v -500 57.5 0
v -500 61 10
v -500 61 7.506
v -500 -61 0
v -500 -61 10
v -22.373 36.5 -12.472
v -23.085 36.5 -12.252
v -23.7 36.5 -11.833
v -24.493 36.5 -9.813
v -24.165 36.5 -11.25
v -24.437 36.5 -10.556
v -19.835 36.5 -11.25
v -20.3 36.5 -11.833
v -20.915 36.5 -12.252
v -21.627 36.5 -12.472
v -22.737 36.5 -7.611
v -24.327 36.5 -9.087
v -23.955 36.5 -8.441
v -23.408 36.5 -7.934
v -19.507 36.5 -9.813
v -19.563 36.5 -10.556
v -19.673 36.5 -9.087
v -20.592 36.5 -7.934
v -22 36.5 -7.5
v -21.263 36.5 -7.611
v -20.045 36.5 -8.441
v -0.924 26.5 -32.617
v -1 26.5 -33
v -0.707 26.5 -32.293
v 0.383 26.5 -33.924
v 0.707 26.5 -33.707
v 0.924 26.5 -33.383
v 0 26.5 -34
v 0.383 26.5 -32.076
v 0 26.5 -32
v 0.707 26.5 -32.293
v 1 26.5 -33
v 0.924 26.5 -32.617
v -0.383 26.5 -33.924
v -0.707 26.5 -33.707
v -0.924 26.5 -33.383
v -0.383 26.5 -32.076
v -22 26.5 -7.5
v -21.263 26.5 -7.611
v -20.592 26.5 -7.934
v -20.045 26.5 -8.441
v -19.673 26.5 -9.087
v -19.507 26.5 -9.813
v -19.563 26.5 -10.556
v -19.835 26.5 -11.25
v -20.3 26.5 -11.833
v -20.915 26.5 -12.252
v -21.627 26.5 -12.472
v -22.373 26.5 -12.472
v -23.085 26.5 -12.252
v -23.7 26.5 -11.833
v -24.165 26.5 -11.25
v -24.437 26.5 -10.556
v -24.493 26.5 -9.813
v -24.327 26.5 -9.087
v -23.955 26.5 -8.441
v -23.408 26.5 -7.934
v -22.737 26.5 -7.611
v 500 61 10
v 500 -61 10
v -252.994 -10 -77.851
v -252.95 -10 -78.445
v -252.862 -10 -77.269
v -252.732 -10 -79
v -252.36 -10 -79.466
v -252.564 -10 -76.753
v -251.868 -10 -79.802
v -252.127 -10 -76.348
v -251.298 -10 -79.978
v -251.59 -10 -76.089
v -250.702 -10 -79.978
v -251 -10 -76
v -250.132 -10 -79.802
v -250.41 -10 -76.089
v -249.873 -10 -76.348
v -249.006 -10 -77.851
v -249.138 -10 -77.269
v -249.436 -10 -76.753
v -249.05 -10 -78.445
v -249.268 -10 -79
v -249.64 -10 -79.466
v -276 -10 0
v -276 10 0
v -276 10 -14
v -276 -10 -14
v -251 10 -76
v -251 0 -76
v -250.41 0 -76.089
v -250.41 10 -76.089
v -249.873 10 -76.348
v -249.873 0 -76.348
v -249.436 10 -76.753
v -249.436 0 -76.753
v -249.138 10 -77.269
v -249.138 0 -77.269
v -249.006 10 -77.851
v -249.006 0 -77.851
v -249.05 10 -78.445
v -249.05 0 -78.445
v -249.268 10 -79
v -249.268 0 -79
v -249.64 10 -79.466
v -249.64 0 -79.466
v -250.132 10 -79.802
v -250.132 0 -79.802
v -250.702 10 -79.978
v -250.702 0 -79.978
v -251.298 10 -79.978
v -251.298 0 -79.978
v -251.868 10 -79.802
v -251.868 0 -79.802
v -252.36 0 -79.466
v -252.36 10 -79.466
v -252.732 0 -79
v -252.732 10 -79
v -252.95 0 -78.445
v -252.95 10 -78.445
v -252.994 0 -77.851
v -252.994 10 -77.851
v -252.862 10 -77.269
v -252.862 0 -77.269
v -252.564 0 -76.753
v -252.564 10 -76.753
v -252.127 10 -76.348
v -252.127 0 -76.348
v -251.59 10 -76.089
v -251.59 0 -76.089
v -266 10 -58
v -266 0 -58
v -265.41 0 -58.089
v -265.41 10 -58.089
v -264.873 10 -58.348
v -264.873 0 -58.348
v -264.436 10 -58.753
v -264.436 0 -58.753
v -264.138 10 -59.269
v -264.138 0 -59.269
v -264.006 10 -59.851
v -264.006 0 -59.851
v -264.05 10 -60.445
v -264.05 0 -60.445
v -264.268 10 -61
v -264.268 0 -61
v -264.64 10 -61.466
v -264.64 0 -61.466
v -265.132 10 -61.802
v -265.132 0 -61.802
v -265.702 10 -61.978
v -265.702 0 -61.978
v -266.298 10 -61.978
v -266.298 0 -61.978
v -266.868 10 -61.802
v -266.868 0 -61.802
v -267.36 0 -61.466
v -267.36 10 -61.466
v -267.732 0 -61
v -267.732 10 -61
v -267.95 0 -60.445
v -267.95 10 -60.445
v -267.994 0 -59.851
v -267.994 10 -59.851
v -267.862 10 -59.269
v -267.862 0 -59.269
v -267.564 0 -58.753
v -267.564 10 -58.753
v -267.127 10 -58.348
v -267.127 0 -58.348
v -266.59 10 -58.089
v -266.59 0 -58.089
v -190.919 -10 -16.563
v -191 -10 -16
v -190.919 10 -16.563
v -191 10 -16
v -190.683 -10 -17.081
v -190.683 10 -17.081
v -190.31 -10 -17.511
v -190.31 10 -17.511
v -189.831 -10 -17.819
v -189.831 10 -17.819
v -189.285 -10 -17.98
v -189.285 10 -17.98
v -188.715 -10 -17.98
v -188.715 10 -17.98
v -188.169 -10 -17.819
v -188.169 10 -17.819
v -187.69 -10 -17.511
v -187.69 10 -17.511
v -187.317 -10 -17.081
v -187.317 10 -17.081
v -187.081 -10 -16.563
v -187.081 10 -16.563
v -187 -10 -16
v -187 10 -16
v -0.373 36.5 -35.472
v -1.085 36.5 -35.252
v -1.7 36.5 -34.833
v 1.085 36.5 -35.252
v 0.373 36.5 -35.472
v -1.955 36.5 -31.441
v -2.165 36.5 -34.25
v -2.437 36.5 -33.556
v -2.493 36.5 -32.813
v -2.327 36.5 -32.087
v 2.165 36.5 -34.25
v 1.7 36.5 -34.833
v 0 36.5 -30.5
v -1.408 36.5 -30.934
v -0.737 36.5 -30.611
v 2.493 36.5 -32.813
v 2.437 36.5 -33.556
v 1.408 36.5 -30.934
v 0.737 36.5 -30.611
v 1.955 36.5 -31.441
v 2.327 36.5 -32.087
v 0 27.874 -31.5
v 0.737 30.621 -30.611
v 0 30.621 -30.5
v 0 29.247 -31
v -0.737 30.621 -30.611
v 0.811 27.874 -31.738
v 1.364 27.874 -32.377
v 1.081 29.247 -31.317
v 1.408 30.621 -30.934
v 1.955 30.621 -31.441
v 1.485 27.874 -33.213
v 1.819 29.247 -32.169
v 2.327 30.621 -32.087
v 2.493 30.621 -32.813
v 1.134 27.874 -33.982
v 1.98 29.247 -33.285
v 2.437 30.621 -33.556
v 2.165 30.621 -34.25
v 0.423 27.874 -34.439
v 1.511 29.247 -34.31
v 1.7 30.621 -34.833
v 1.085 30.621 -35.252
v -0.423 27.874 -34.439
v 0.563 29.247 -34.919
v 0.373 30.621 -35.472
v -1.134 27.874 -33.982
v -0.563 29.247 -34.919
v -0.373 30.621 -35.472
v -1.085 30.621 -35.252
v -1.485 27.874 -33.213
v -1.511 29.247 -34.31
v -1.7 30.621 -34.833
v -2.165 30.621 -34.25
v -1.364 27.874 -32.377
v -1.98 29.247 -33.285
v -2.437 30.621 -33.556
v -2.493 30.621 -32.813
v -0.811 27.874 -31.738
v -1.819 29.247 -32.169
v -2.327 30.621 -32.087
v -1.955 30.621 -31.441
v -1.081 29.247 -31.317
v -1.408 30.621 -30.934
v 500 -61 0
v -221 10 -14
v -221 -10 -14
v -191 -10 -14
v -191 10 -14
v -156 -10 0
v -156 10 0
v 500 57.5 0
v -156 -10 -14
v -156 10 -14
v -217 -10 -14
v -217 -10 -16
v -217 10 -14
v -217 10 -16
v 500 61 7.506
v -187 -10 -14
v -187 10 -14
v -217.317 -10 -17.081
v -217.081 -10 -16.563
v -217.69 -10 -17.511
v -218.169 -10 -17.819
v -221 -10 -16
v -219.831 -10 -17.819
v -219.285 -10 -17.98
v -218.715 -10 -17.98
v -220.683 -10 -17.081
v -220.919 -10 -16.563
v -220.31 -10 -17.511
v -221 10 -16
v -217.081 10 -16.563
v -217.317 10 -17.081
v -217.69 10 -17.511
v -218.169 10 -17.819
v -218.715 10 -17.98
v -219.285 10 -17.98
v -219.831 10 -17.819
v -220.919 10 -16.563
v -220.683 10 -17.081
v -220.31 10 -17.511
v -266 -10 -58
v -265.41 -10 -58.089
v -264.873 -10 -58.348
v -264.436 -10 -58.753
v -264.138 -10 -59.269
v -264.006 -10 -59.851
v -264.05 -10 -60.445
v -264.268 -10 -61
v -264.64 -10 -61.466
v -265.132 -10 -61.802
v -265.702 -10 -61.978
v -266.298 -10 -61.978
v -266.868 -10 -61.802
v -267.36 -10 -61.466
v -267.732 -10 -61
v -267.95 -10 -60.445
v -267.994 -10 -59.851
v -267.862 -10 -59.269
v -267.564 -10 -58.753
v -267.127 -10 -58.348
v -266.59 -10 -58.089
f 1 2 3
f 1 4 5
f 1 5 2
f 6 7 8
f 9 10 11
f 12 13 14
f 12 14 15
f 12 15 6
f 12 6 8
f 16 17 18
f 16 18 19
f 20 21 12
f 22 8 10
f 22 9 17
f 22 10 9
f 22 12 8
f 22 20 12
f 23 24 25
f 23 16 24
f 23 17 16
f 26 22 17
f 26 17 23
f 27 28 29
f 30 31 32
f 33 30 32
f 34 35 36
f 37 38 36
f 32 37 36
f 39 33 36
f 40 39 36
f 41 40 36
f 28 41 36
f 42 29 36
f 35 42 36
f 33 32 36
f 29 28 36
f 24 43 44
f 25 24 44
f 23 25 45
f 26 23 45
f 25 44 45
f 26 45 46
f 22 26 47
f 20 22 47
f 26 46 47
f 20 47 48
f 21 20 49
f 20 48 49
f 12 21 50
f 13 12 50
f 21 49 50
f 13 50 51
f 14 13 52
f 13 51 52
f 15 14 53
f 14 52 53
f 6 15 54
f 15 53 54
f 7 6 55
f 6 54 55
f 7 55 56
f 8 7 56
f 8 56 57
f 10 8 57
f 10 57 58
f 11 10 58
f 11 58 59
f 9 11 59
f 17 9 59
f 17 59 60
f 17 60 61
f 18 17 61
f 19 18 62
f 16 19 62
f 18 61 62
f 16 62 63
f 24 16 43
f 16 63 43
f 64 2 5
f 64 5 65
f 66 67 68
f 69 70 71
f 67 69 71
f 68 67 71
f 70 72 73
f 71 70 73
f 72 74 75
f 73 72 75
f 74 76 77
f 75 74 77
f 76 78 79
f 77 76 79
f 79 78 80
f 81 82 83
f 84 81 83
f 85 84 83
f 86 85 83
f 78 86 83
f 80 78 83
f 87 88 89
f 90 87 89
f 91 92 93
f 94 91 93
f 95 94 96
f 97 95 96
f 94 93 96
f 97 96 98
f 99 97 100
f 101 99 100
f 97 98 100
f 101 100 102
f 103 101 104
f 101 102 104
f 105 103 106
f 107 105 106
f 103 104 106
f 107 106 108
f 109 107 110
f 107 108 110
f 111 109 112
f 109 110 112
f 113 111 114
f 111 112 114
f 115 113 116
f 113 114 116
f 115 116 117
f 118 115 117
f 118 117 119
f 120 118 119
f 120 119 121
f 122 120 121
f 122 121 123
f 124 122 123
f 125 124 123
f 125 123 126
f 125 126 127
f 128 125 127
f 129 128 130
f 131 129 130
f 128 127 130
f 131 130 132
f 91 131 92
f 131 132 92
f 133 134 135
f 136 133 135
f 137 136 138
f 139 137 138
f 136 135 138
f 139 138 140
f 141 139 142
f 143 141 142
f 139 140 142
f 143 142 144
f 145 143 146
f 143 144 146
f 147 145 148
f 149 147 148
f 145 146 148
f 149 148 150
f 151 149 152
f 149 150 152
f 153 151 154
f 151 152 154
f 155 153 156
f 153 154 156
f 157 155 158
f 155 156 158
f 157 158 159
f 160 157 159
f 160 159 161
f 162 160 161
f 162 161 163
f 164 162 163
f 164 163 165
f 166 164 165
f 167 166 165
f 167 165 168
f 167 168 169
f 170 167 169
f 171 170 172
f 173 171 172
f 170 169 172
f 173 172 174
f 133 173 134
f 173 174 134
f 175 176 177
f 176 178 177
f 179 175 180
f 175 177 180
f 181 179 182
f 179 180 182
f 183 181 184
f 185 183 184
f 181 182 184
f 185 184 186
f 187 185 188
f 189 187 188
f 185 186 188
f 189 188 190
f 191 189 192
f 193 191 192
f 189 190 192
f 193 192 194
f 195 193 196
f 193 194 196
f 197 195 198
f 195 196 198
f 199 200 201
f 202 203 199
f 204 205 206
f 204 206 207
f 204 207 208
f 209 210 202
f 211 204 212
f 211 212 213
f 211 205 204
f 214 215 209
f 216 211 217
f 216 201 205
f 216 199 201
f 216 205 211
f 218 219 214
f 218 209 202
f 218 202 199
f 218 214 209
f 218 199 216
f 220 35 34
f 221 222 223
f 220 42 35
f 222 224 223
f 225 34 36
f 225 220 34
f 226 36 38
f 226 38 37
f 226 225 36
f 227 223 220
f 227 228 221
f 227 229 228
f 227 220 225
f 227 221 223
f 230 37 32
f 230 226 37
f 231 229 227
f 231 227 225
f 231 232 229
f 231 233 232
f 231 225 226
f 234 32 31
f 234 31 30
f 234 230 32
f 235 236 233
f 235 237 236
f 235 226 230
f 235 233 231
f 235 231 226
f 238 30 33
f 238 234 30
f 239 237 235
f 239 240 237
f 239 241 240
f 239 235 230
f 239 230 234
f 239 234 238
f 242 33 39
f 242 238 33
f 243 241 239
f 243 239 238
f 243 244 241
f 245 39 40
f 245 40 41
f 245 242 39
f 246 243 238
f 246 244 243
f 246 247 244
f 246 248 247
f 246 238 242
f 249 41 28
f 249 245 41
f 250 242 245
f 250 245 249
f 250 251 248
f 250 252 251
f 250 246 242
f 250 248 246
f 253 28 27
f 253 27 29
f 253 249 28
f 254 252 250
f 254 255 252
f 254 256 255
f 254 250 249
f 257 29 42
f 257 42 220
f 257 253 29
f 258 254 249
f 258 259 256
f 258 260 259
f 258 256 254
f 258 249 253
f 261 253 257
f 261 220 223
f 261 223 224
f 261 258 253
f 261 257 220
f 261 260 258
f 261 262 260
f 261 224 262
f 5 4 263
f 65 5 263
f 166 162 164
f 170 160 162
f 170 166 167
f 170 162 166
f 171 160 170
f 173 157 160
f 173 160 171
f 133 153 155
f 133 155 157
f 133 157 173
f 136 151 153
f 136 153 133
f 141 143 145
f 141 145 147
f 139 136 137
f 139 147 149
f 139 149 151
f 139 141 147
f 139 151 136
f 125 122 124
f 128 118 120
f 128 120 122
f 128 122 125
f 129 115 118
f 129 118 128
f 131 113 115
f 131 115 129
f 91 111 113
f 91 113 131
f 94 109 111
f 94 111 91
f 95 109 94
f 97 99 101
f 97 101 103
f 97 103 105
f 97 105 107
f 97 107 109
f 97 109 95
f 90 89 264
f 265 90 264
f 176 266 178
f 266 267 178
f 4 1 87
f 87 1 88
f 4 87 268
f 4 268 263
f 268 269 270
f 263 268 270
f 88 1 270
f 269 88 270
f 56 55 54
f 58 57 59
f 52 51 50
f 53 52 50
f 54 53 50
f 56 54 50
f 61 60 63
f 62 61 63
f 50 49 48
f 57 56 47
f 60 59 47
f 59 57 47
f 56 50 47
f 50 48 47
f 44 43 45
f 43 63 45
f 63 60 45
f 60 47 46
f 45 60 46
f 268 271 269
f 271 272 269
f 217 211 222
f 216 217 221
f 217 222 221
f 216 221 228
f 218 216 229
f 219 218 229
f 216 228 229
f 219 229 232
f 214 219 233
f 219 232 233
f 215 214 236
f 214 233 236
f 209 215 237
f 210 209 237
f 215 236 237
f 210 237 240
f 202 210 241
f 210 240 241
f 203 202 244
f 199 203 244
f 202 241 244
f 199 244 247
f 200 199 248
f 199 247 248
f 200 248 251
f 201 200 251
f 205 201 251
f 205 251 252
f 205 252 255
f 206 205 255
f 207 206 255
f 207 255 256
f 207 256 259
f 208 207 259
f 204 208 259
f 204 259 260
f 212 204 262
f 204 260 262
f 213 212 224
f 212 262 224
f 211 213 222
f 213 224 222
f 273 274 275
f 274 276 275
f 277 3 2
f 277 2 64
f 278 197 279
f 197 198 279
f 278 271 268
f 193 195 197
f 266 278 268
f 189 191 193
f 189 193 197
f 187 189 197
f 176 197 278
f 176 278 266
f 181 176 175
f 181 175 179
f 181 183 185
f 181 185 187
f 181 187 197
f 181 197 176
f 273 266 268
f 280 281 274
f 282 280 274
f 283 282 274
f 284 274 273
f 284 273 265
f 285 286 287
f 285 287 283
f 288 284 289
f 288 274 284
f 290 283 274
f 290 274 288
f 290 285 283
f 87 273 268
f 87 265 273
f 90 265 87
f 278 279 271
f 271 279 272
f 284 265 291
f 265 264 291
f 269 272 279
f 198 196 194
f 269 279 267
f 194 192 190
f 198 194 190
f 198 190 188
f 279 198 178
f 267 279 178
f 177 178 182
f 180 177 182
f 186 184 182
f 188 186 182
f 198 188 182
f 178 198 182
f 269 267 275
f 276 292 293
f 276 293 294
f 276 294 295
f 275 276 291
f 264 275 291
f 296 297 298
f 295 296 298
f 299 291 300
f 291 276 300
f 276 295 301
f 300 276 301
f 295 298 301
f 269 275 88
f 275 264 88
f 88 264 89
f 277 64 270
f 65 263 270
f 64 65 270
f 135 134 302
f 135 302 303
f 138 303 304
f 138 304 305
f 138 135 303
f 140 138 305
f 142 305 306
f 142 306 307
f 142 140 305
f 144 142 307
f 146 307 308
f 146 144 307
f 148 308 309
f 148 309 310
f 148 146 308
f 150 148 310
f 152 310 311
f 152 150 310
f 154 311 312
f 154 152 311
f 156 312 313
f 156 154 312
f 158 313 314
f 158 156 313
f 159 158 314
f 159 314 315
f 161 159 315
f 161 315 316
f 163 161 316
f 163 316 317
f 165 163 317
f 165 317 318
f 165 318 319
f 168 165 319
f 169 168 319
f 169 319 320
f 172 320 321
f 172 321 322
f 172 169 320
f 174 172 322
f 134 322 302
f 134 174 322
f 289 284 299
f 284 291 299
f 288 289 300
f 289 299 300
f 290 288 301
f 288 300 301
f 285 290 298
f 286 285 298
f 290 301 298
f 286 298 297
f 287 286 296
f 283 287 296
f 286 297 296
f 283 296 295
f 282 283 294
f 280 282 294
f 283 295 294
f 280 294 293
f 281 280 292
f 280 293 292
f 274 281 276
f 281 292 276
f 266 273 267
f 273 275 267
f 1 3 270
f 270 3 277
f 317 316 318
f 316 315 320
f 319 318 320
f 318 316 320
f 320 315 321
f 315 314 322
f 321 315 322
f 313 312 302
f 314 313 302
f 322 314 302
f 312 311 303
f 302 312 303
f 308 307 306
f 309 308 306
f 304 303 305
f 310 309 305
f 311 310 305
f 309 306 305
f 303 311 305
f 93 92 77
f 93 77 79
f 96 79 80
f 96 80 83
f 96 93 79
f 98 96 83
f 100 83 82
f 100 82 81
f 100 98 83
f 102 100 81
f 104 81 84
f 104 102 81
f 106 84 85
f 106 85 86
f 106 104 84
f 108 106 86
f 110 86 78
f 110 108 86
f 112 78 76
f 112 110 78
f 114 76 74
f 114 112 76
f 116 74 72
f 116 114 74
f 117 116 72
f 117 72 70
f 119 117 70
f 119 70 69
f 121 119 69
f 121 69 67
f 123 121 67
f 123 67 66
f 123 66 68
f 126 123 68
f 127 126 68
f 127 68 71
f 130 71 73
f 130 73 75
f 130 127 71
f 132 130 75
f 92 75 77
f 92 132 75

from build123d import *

# Parameters (mm, degrees)
SKETCH1_W                 = 1000
SKETCH1_H                 = 122
BOARD_DEPTH               = 10
BOARD_CHAMFER_SIZE        = 3.5
BOARD_CHAMFER_SIZE2       = 7.505774222
DYNAFIT_START             = 26.5
SKETCH2_R                 = 2.5
DYNAFIT_DEPTH             = 10
DYNAFIT_2_DEPTH           = 10
DYNAFIT_PIN_CHAMFER_SIZE  = 1.5
DYNAFIT_PIN_CHAMFER_SIZE2 = 4.121216129
SKETCH5_R                 = 2
RISER_DEPTH               = 10


with BuildPart() as part:
    # Sketch1 → Board (new body)
    with BuildSketch(Plane.XY):
        Rectangle(SKETCH1_W, SKETCH1_H)
    extrude(amount=BOARD_DEPTH)

    # Board chamfer
    board_chamfer_edges = [part.edges().sort_by_distance(p)[0] for p in [
        (0, 61, 0),
    ]]
    board_chamfer_side = [part.faces().sort_by_distance(p)[0] for p in [
        (0, 0, 0),
    ]]
    chamfer(board_chamfer_edges, length=BOARD_CHAMFER_SIZE, length2=BOARD_CHAMFER_SIZE2, reference=board_chamfer_side[0])

    # Sketch5 → Riser (add, symmetric)
    with BuildSketch(Plane(origin=(0, 0, 0), x_dir=(1, 0, 0), z_dir=(0, 1, 0))):
        with Locations(Location((-266, 60, 0), (0, 0, 270))):
            Circle(SKETCH5_R)
        with Locations(Location((-251, 78, 0), (0, 0, 270))):
            Circle(SKETCH5_R)
        with BuildLine():
            Line((-276, 14), (-221, 14))
            Line((-221, 14), (-221, 16))
            ThreePointArc((-221, 16), (-219, 18), (-217, 16))
            Line((-217, 16), (-217, 14))
            Line((-217, 14), (-191, 14))
            Line((-191, 14), (-191, 16))
            ThreePointArc((-191, 16), (-189, 18), (-187, 16))
            Line((-187, 16), (-187, 14))
            Line((-187, 14), (-156, 14))
            Line((-156, 14), (-156, 0))
            Line((-156, 0), (-276, 0))
            Line((-276, 0), (-276, 14))
        make_face()
    extrude(amount=RISER_DEPTH, both=True)


with BuildPart() as body_2:
    # Sketch2 → Dynafit (new body)
    with BuildSketch(Plane(origin=(0, 0, 0), x_dir=(1, 0, 0), z_dir=(0, 1, 0)).offset(DYNAFIT_START)):
        with Locations(Location((0, 33, 0), (0, 0, 270))):
            Circle(SKETCH2_R)
    extrude(amount=DYNAFIT_DEPTH)

    # Dynafit pin chamfer
    dynafit_pin_chamfer_edges = [body_2.edges().sort_by_distance(p)[0] for p in [
        (0, 26.5, -35.5),
    ]]
    dynafit_pin_chamfer_side = [body_2.faces().sort_by_distance(p)[0] for p in [
        (0, 26.5, -33),
    ]]
    chamfer(dynafit_pin_chamfer_edges, length=DYNAFIT_PIN_CHAMFER_SIZE, length2=DYNAFIT_PIN_CHAMFER_SIZE2, reference=dynafit_pin_chamfer_side[0])


with BuildPart() as body_3:
    # Sketch2 → Dynafit 2 (new body)
    with BuildSketch(Plane(origin=(0, 0, 0), x_dir=(1, 0, 0), z_dir=(0, 1, 0)).offset(DYNAFIT_START)):
        with Locations(Location((-22, 10, 0), (0, 0, 270))):
            Circle(SKETCH2_R)
    extrude(amount=DYNAFIT_2_DEPTH)


with BuildPart() as riser_piece_1:
    # of the separate pieces the step leaves, piece 1, a body of its own (riser_pieces)
    add(part.part.solids().sort_by_distance((500, 61, 7.505774222))[0])


with BuildPart() as riser_piece_2:
    # of the separate pieces the step leaves, piece 2, a body of its own (riser_pieces)
    add(part.part.solids().sort_by_distance((-266, -10, -58))[0])


with BuildPart() as riser_piece_3:
    # of the separate pieces the step leaves, piece 3, a body of its own (riser_pieces)
    add(part.part.solids().sort_by_distance((-251, -10, -76))[0])


solid = Compound([body_2.part, body_3.part, riser_piece_1.part, riser_piece_2.part, riser_piece_3.part])
